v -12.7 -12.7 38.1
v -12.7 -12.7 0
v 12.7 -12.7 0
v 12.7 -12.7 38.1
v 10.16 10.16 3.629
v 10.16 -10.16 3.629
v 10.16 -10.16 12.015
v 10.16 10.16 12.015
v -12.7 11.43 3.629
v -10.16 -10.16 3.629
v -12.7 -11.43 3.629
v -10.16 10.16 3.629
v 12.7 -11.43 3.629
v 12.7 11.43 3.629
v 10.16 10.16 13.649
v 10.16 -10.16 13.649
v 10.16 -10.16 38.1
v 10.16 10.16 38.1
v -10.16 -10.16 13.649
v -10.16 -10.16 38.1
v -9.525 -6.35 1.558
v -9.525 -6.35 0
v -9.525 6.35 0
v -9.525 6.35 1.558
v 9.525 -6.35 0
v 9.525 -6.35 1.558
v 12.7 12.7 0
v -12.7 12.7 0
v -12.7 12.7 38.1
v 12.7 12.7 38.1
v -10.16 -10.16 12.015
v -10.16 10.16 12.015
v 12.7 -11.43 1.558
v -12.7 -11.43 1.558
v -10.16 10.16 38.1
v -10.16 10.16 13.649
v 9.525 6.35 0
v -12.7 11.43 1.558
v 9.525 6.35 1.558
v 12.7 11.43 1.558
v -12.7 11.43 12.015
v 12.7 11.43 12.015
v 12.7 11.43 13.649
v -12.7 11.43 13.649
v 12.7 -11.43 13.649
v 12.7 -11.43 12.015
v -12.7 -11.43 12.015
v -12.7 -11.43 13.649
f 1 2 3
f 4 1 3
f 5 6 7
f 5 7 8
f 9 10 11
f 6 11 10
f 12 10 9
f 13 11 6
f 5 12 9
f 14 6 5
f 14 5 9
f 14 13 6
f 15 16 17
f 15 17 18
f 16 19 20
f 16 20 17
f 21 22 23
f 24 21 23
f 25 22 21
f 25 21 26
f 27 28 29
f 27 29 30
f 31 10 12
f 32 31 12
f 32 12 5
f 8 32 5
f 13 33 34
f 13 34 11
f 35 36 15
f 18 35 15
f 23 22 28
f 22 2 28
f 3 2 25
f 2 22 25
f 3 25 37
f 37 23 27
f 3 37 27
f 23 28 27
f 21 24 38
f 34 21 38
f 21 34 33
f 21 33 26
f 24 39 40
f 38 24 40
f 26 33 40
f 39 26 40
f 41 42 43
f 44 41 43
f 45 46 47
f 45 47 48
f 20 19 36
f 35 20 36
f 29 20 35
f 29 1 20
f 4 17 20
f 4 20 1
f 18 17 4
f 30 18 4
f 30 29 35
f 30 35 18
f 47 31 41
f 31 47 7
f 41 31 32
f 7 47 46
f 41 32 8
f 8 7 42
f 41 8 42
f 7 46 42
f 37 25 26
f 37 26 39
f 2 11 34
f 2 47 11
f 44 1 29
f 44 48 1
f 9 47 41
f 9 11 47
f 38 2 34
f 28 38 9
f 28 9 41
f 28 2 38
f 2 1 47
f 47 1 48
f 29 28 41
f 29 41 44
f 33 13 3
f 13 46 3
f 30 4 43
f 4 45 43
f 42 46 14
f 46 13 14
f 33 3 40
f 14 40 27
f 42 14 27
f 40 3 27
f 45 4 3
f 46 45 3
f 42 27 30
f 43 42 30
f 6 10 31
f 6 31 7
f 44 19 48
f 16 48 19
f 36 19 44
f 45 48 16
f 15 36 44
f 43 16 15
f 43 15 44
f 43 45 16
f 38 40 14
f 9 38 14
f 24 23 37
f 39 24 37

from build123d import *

# Parameters (mm, degrees)
F0_W          = 25.4
F0_H          = 25.4
F1_DEPTH      = 38.1
F2_T          = -2.54
F3_W          = 19.05
F3_H          = 12.7
F4_DEPTH      = 25.4
F5_W          = 22.86
F5_H          = 2.071403
F6_DEPTH      = 25.4
F6_DEPTH_BACK = 25.4
F7_W          = 22.86
F7_H          = 1.634075
F8_DEPTH      = 25.4
F8_DEPTH_BACK = 25.4


with BuildPart() as f1:
    # F0 (on Top) → F1 (new body)
    with BuildSketch(Plane.XY):
        Rectangle(F0_W, F0_H)
    extrude(amount=F1_DEPTH)

    # F2
    f2_openings = [f1.faces().sort_by_distance(p)[0] for p in [
        (0, 0, 38.1),
    ]]
    offset(amount=F2_T, openings=f2_openings)

    # F3 (on Top) → F4 (cut)
    with BuildSketch(Plane.XY):
        Rectangle(F3_W, F3_H)
    extrude(amount=F4_DEPTH, mode=Mode.SUBTRACT)

    # F5 (on Right) → F6 (cut, two sides)
    with BuildSketch(Plane.YZ) as f6_sk:
        with Locations((0, 2.593235)):
            Rectangle(F5_W, F5_H)
    extrude(amount=F6_DEPTH, mode=Mode.SUBTRACT)
    extrude(f6_sk.sketch, amount=-F6_DEPTH_BACK, mode=Mode.SUBTRACT)

    # F7 (on Right) → F8 (cut, two sides)
    with BuildSketch(Plane.YZ) as f8_sk:
        with Locations((0, 12.831571)):
            Rectangle(F7_W, F7_H)
    extrude(amount=F8_DEPTH, mode=Mode.SUBTRACT)
    extrude(f8_sk.sketch, amount=-F8_DEPTH_BACK, mode=Mode.SUBTRACT)


solid = f1.part
